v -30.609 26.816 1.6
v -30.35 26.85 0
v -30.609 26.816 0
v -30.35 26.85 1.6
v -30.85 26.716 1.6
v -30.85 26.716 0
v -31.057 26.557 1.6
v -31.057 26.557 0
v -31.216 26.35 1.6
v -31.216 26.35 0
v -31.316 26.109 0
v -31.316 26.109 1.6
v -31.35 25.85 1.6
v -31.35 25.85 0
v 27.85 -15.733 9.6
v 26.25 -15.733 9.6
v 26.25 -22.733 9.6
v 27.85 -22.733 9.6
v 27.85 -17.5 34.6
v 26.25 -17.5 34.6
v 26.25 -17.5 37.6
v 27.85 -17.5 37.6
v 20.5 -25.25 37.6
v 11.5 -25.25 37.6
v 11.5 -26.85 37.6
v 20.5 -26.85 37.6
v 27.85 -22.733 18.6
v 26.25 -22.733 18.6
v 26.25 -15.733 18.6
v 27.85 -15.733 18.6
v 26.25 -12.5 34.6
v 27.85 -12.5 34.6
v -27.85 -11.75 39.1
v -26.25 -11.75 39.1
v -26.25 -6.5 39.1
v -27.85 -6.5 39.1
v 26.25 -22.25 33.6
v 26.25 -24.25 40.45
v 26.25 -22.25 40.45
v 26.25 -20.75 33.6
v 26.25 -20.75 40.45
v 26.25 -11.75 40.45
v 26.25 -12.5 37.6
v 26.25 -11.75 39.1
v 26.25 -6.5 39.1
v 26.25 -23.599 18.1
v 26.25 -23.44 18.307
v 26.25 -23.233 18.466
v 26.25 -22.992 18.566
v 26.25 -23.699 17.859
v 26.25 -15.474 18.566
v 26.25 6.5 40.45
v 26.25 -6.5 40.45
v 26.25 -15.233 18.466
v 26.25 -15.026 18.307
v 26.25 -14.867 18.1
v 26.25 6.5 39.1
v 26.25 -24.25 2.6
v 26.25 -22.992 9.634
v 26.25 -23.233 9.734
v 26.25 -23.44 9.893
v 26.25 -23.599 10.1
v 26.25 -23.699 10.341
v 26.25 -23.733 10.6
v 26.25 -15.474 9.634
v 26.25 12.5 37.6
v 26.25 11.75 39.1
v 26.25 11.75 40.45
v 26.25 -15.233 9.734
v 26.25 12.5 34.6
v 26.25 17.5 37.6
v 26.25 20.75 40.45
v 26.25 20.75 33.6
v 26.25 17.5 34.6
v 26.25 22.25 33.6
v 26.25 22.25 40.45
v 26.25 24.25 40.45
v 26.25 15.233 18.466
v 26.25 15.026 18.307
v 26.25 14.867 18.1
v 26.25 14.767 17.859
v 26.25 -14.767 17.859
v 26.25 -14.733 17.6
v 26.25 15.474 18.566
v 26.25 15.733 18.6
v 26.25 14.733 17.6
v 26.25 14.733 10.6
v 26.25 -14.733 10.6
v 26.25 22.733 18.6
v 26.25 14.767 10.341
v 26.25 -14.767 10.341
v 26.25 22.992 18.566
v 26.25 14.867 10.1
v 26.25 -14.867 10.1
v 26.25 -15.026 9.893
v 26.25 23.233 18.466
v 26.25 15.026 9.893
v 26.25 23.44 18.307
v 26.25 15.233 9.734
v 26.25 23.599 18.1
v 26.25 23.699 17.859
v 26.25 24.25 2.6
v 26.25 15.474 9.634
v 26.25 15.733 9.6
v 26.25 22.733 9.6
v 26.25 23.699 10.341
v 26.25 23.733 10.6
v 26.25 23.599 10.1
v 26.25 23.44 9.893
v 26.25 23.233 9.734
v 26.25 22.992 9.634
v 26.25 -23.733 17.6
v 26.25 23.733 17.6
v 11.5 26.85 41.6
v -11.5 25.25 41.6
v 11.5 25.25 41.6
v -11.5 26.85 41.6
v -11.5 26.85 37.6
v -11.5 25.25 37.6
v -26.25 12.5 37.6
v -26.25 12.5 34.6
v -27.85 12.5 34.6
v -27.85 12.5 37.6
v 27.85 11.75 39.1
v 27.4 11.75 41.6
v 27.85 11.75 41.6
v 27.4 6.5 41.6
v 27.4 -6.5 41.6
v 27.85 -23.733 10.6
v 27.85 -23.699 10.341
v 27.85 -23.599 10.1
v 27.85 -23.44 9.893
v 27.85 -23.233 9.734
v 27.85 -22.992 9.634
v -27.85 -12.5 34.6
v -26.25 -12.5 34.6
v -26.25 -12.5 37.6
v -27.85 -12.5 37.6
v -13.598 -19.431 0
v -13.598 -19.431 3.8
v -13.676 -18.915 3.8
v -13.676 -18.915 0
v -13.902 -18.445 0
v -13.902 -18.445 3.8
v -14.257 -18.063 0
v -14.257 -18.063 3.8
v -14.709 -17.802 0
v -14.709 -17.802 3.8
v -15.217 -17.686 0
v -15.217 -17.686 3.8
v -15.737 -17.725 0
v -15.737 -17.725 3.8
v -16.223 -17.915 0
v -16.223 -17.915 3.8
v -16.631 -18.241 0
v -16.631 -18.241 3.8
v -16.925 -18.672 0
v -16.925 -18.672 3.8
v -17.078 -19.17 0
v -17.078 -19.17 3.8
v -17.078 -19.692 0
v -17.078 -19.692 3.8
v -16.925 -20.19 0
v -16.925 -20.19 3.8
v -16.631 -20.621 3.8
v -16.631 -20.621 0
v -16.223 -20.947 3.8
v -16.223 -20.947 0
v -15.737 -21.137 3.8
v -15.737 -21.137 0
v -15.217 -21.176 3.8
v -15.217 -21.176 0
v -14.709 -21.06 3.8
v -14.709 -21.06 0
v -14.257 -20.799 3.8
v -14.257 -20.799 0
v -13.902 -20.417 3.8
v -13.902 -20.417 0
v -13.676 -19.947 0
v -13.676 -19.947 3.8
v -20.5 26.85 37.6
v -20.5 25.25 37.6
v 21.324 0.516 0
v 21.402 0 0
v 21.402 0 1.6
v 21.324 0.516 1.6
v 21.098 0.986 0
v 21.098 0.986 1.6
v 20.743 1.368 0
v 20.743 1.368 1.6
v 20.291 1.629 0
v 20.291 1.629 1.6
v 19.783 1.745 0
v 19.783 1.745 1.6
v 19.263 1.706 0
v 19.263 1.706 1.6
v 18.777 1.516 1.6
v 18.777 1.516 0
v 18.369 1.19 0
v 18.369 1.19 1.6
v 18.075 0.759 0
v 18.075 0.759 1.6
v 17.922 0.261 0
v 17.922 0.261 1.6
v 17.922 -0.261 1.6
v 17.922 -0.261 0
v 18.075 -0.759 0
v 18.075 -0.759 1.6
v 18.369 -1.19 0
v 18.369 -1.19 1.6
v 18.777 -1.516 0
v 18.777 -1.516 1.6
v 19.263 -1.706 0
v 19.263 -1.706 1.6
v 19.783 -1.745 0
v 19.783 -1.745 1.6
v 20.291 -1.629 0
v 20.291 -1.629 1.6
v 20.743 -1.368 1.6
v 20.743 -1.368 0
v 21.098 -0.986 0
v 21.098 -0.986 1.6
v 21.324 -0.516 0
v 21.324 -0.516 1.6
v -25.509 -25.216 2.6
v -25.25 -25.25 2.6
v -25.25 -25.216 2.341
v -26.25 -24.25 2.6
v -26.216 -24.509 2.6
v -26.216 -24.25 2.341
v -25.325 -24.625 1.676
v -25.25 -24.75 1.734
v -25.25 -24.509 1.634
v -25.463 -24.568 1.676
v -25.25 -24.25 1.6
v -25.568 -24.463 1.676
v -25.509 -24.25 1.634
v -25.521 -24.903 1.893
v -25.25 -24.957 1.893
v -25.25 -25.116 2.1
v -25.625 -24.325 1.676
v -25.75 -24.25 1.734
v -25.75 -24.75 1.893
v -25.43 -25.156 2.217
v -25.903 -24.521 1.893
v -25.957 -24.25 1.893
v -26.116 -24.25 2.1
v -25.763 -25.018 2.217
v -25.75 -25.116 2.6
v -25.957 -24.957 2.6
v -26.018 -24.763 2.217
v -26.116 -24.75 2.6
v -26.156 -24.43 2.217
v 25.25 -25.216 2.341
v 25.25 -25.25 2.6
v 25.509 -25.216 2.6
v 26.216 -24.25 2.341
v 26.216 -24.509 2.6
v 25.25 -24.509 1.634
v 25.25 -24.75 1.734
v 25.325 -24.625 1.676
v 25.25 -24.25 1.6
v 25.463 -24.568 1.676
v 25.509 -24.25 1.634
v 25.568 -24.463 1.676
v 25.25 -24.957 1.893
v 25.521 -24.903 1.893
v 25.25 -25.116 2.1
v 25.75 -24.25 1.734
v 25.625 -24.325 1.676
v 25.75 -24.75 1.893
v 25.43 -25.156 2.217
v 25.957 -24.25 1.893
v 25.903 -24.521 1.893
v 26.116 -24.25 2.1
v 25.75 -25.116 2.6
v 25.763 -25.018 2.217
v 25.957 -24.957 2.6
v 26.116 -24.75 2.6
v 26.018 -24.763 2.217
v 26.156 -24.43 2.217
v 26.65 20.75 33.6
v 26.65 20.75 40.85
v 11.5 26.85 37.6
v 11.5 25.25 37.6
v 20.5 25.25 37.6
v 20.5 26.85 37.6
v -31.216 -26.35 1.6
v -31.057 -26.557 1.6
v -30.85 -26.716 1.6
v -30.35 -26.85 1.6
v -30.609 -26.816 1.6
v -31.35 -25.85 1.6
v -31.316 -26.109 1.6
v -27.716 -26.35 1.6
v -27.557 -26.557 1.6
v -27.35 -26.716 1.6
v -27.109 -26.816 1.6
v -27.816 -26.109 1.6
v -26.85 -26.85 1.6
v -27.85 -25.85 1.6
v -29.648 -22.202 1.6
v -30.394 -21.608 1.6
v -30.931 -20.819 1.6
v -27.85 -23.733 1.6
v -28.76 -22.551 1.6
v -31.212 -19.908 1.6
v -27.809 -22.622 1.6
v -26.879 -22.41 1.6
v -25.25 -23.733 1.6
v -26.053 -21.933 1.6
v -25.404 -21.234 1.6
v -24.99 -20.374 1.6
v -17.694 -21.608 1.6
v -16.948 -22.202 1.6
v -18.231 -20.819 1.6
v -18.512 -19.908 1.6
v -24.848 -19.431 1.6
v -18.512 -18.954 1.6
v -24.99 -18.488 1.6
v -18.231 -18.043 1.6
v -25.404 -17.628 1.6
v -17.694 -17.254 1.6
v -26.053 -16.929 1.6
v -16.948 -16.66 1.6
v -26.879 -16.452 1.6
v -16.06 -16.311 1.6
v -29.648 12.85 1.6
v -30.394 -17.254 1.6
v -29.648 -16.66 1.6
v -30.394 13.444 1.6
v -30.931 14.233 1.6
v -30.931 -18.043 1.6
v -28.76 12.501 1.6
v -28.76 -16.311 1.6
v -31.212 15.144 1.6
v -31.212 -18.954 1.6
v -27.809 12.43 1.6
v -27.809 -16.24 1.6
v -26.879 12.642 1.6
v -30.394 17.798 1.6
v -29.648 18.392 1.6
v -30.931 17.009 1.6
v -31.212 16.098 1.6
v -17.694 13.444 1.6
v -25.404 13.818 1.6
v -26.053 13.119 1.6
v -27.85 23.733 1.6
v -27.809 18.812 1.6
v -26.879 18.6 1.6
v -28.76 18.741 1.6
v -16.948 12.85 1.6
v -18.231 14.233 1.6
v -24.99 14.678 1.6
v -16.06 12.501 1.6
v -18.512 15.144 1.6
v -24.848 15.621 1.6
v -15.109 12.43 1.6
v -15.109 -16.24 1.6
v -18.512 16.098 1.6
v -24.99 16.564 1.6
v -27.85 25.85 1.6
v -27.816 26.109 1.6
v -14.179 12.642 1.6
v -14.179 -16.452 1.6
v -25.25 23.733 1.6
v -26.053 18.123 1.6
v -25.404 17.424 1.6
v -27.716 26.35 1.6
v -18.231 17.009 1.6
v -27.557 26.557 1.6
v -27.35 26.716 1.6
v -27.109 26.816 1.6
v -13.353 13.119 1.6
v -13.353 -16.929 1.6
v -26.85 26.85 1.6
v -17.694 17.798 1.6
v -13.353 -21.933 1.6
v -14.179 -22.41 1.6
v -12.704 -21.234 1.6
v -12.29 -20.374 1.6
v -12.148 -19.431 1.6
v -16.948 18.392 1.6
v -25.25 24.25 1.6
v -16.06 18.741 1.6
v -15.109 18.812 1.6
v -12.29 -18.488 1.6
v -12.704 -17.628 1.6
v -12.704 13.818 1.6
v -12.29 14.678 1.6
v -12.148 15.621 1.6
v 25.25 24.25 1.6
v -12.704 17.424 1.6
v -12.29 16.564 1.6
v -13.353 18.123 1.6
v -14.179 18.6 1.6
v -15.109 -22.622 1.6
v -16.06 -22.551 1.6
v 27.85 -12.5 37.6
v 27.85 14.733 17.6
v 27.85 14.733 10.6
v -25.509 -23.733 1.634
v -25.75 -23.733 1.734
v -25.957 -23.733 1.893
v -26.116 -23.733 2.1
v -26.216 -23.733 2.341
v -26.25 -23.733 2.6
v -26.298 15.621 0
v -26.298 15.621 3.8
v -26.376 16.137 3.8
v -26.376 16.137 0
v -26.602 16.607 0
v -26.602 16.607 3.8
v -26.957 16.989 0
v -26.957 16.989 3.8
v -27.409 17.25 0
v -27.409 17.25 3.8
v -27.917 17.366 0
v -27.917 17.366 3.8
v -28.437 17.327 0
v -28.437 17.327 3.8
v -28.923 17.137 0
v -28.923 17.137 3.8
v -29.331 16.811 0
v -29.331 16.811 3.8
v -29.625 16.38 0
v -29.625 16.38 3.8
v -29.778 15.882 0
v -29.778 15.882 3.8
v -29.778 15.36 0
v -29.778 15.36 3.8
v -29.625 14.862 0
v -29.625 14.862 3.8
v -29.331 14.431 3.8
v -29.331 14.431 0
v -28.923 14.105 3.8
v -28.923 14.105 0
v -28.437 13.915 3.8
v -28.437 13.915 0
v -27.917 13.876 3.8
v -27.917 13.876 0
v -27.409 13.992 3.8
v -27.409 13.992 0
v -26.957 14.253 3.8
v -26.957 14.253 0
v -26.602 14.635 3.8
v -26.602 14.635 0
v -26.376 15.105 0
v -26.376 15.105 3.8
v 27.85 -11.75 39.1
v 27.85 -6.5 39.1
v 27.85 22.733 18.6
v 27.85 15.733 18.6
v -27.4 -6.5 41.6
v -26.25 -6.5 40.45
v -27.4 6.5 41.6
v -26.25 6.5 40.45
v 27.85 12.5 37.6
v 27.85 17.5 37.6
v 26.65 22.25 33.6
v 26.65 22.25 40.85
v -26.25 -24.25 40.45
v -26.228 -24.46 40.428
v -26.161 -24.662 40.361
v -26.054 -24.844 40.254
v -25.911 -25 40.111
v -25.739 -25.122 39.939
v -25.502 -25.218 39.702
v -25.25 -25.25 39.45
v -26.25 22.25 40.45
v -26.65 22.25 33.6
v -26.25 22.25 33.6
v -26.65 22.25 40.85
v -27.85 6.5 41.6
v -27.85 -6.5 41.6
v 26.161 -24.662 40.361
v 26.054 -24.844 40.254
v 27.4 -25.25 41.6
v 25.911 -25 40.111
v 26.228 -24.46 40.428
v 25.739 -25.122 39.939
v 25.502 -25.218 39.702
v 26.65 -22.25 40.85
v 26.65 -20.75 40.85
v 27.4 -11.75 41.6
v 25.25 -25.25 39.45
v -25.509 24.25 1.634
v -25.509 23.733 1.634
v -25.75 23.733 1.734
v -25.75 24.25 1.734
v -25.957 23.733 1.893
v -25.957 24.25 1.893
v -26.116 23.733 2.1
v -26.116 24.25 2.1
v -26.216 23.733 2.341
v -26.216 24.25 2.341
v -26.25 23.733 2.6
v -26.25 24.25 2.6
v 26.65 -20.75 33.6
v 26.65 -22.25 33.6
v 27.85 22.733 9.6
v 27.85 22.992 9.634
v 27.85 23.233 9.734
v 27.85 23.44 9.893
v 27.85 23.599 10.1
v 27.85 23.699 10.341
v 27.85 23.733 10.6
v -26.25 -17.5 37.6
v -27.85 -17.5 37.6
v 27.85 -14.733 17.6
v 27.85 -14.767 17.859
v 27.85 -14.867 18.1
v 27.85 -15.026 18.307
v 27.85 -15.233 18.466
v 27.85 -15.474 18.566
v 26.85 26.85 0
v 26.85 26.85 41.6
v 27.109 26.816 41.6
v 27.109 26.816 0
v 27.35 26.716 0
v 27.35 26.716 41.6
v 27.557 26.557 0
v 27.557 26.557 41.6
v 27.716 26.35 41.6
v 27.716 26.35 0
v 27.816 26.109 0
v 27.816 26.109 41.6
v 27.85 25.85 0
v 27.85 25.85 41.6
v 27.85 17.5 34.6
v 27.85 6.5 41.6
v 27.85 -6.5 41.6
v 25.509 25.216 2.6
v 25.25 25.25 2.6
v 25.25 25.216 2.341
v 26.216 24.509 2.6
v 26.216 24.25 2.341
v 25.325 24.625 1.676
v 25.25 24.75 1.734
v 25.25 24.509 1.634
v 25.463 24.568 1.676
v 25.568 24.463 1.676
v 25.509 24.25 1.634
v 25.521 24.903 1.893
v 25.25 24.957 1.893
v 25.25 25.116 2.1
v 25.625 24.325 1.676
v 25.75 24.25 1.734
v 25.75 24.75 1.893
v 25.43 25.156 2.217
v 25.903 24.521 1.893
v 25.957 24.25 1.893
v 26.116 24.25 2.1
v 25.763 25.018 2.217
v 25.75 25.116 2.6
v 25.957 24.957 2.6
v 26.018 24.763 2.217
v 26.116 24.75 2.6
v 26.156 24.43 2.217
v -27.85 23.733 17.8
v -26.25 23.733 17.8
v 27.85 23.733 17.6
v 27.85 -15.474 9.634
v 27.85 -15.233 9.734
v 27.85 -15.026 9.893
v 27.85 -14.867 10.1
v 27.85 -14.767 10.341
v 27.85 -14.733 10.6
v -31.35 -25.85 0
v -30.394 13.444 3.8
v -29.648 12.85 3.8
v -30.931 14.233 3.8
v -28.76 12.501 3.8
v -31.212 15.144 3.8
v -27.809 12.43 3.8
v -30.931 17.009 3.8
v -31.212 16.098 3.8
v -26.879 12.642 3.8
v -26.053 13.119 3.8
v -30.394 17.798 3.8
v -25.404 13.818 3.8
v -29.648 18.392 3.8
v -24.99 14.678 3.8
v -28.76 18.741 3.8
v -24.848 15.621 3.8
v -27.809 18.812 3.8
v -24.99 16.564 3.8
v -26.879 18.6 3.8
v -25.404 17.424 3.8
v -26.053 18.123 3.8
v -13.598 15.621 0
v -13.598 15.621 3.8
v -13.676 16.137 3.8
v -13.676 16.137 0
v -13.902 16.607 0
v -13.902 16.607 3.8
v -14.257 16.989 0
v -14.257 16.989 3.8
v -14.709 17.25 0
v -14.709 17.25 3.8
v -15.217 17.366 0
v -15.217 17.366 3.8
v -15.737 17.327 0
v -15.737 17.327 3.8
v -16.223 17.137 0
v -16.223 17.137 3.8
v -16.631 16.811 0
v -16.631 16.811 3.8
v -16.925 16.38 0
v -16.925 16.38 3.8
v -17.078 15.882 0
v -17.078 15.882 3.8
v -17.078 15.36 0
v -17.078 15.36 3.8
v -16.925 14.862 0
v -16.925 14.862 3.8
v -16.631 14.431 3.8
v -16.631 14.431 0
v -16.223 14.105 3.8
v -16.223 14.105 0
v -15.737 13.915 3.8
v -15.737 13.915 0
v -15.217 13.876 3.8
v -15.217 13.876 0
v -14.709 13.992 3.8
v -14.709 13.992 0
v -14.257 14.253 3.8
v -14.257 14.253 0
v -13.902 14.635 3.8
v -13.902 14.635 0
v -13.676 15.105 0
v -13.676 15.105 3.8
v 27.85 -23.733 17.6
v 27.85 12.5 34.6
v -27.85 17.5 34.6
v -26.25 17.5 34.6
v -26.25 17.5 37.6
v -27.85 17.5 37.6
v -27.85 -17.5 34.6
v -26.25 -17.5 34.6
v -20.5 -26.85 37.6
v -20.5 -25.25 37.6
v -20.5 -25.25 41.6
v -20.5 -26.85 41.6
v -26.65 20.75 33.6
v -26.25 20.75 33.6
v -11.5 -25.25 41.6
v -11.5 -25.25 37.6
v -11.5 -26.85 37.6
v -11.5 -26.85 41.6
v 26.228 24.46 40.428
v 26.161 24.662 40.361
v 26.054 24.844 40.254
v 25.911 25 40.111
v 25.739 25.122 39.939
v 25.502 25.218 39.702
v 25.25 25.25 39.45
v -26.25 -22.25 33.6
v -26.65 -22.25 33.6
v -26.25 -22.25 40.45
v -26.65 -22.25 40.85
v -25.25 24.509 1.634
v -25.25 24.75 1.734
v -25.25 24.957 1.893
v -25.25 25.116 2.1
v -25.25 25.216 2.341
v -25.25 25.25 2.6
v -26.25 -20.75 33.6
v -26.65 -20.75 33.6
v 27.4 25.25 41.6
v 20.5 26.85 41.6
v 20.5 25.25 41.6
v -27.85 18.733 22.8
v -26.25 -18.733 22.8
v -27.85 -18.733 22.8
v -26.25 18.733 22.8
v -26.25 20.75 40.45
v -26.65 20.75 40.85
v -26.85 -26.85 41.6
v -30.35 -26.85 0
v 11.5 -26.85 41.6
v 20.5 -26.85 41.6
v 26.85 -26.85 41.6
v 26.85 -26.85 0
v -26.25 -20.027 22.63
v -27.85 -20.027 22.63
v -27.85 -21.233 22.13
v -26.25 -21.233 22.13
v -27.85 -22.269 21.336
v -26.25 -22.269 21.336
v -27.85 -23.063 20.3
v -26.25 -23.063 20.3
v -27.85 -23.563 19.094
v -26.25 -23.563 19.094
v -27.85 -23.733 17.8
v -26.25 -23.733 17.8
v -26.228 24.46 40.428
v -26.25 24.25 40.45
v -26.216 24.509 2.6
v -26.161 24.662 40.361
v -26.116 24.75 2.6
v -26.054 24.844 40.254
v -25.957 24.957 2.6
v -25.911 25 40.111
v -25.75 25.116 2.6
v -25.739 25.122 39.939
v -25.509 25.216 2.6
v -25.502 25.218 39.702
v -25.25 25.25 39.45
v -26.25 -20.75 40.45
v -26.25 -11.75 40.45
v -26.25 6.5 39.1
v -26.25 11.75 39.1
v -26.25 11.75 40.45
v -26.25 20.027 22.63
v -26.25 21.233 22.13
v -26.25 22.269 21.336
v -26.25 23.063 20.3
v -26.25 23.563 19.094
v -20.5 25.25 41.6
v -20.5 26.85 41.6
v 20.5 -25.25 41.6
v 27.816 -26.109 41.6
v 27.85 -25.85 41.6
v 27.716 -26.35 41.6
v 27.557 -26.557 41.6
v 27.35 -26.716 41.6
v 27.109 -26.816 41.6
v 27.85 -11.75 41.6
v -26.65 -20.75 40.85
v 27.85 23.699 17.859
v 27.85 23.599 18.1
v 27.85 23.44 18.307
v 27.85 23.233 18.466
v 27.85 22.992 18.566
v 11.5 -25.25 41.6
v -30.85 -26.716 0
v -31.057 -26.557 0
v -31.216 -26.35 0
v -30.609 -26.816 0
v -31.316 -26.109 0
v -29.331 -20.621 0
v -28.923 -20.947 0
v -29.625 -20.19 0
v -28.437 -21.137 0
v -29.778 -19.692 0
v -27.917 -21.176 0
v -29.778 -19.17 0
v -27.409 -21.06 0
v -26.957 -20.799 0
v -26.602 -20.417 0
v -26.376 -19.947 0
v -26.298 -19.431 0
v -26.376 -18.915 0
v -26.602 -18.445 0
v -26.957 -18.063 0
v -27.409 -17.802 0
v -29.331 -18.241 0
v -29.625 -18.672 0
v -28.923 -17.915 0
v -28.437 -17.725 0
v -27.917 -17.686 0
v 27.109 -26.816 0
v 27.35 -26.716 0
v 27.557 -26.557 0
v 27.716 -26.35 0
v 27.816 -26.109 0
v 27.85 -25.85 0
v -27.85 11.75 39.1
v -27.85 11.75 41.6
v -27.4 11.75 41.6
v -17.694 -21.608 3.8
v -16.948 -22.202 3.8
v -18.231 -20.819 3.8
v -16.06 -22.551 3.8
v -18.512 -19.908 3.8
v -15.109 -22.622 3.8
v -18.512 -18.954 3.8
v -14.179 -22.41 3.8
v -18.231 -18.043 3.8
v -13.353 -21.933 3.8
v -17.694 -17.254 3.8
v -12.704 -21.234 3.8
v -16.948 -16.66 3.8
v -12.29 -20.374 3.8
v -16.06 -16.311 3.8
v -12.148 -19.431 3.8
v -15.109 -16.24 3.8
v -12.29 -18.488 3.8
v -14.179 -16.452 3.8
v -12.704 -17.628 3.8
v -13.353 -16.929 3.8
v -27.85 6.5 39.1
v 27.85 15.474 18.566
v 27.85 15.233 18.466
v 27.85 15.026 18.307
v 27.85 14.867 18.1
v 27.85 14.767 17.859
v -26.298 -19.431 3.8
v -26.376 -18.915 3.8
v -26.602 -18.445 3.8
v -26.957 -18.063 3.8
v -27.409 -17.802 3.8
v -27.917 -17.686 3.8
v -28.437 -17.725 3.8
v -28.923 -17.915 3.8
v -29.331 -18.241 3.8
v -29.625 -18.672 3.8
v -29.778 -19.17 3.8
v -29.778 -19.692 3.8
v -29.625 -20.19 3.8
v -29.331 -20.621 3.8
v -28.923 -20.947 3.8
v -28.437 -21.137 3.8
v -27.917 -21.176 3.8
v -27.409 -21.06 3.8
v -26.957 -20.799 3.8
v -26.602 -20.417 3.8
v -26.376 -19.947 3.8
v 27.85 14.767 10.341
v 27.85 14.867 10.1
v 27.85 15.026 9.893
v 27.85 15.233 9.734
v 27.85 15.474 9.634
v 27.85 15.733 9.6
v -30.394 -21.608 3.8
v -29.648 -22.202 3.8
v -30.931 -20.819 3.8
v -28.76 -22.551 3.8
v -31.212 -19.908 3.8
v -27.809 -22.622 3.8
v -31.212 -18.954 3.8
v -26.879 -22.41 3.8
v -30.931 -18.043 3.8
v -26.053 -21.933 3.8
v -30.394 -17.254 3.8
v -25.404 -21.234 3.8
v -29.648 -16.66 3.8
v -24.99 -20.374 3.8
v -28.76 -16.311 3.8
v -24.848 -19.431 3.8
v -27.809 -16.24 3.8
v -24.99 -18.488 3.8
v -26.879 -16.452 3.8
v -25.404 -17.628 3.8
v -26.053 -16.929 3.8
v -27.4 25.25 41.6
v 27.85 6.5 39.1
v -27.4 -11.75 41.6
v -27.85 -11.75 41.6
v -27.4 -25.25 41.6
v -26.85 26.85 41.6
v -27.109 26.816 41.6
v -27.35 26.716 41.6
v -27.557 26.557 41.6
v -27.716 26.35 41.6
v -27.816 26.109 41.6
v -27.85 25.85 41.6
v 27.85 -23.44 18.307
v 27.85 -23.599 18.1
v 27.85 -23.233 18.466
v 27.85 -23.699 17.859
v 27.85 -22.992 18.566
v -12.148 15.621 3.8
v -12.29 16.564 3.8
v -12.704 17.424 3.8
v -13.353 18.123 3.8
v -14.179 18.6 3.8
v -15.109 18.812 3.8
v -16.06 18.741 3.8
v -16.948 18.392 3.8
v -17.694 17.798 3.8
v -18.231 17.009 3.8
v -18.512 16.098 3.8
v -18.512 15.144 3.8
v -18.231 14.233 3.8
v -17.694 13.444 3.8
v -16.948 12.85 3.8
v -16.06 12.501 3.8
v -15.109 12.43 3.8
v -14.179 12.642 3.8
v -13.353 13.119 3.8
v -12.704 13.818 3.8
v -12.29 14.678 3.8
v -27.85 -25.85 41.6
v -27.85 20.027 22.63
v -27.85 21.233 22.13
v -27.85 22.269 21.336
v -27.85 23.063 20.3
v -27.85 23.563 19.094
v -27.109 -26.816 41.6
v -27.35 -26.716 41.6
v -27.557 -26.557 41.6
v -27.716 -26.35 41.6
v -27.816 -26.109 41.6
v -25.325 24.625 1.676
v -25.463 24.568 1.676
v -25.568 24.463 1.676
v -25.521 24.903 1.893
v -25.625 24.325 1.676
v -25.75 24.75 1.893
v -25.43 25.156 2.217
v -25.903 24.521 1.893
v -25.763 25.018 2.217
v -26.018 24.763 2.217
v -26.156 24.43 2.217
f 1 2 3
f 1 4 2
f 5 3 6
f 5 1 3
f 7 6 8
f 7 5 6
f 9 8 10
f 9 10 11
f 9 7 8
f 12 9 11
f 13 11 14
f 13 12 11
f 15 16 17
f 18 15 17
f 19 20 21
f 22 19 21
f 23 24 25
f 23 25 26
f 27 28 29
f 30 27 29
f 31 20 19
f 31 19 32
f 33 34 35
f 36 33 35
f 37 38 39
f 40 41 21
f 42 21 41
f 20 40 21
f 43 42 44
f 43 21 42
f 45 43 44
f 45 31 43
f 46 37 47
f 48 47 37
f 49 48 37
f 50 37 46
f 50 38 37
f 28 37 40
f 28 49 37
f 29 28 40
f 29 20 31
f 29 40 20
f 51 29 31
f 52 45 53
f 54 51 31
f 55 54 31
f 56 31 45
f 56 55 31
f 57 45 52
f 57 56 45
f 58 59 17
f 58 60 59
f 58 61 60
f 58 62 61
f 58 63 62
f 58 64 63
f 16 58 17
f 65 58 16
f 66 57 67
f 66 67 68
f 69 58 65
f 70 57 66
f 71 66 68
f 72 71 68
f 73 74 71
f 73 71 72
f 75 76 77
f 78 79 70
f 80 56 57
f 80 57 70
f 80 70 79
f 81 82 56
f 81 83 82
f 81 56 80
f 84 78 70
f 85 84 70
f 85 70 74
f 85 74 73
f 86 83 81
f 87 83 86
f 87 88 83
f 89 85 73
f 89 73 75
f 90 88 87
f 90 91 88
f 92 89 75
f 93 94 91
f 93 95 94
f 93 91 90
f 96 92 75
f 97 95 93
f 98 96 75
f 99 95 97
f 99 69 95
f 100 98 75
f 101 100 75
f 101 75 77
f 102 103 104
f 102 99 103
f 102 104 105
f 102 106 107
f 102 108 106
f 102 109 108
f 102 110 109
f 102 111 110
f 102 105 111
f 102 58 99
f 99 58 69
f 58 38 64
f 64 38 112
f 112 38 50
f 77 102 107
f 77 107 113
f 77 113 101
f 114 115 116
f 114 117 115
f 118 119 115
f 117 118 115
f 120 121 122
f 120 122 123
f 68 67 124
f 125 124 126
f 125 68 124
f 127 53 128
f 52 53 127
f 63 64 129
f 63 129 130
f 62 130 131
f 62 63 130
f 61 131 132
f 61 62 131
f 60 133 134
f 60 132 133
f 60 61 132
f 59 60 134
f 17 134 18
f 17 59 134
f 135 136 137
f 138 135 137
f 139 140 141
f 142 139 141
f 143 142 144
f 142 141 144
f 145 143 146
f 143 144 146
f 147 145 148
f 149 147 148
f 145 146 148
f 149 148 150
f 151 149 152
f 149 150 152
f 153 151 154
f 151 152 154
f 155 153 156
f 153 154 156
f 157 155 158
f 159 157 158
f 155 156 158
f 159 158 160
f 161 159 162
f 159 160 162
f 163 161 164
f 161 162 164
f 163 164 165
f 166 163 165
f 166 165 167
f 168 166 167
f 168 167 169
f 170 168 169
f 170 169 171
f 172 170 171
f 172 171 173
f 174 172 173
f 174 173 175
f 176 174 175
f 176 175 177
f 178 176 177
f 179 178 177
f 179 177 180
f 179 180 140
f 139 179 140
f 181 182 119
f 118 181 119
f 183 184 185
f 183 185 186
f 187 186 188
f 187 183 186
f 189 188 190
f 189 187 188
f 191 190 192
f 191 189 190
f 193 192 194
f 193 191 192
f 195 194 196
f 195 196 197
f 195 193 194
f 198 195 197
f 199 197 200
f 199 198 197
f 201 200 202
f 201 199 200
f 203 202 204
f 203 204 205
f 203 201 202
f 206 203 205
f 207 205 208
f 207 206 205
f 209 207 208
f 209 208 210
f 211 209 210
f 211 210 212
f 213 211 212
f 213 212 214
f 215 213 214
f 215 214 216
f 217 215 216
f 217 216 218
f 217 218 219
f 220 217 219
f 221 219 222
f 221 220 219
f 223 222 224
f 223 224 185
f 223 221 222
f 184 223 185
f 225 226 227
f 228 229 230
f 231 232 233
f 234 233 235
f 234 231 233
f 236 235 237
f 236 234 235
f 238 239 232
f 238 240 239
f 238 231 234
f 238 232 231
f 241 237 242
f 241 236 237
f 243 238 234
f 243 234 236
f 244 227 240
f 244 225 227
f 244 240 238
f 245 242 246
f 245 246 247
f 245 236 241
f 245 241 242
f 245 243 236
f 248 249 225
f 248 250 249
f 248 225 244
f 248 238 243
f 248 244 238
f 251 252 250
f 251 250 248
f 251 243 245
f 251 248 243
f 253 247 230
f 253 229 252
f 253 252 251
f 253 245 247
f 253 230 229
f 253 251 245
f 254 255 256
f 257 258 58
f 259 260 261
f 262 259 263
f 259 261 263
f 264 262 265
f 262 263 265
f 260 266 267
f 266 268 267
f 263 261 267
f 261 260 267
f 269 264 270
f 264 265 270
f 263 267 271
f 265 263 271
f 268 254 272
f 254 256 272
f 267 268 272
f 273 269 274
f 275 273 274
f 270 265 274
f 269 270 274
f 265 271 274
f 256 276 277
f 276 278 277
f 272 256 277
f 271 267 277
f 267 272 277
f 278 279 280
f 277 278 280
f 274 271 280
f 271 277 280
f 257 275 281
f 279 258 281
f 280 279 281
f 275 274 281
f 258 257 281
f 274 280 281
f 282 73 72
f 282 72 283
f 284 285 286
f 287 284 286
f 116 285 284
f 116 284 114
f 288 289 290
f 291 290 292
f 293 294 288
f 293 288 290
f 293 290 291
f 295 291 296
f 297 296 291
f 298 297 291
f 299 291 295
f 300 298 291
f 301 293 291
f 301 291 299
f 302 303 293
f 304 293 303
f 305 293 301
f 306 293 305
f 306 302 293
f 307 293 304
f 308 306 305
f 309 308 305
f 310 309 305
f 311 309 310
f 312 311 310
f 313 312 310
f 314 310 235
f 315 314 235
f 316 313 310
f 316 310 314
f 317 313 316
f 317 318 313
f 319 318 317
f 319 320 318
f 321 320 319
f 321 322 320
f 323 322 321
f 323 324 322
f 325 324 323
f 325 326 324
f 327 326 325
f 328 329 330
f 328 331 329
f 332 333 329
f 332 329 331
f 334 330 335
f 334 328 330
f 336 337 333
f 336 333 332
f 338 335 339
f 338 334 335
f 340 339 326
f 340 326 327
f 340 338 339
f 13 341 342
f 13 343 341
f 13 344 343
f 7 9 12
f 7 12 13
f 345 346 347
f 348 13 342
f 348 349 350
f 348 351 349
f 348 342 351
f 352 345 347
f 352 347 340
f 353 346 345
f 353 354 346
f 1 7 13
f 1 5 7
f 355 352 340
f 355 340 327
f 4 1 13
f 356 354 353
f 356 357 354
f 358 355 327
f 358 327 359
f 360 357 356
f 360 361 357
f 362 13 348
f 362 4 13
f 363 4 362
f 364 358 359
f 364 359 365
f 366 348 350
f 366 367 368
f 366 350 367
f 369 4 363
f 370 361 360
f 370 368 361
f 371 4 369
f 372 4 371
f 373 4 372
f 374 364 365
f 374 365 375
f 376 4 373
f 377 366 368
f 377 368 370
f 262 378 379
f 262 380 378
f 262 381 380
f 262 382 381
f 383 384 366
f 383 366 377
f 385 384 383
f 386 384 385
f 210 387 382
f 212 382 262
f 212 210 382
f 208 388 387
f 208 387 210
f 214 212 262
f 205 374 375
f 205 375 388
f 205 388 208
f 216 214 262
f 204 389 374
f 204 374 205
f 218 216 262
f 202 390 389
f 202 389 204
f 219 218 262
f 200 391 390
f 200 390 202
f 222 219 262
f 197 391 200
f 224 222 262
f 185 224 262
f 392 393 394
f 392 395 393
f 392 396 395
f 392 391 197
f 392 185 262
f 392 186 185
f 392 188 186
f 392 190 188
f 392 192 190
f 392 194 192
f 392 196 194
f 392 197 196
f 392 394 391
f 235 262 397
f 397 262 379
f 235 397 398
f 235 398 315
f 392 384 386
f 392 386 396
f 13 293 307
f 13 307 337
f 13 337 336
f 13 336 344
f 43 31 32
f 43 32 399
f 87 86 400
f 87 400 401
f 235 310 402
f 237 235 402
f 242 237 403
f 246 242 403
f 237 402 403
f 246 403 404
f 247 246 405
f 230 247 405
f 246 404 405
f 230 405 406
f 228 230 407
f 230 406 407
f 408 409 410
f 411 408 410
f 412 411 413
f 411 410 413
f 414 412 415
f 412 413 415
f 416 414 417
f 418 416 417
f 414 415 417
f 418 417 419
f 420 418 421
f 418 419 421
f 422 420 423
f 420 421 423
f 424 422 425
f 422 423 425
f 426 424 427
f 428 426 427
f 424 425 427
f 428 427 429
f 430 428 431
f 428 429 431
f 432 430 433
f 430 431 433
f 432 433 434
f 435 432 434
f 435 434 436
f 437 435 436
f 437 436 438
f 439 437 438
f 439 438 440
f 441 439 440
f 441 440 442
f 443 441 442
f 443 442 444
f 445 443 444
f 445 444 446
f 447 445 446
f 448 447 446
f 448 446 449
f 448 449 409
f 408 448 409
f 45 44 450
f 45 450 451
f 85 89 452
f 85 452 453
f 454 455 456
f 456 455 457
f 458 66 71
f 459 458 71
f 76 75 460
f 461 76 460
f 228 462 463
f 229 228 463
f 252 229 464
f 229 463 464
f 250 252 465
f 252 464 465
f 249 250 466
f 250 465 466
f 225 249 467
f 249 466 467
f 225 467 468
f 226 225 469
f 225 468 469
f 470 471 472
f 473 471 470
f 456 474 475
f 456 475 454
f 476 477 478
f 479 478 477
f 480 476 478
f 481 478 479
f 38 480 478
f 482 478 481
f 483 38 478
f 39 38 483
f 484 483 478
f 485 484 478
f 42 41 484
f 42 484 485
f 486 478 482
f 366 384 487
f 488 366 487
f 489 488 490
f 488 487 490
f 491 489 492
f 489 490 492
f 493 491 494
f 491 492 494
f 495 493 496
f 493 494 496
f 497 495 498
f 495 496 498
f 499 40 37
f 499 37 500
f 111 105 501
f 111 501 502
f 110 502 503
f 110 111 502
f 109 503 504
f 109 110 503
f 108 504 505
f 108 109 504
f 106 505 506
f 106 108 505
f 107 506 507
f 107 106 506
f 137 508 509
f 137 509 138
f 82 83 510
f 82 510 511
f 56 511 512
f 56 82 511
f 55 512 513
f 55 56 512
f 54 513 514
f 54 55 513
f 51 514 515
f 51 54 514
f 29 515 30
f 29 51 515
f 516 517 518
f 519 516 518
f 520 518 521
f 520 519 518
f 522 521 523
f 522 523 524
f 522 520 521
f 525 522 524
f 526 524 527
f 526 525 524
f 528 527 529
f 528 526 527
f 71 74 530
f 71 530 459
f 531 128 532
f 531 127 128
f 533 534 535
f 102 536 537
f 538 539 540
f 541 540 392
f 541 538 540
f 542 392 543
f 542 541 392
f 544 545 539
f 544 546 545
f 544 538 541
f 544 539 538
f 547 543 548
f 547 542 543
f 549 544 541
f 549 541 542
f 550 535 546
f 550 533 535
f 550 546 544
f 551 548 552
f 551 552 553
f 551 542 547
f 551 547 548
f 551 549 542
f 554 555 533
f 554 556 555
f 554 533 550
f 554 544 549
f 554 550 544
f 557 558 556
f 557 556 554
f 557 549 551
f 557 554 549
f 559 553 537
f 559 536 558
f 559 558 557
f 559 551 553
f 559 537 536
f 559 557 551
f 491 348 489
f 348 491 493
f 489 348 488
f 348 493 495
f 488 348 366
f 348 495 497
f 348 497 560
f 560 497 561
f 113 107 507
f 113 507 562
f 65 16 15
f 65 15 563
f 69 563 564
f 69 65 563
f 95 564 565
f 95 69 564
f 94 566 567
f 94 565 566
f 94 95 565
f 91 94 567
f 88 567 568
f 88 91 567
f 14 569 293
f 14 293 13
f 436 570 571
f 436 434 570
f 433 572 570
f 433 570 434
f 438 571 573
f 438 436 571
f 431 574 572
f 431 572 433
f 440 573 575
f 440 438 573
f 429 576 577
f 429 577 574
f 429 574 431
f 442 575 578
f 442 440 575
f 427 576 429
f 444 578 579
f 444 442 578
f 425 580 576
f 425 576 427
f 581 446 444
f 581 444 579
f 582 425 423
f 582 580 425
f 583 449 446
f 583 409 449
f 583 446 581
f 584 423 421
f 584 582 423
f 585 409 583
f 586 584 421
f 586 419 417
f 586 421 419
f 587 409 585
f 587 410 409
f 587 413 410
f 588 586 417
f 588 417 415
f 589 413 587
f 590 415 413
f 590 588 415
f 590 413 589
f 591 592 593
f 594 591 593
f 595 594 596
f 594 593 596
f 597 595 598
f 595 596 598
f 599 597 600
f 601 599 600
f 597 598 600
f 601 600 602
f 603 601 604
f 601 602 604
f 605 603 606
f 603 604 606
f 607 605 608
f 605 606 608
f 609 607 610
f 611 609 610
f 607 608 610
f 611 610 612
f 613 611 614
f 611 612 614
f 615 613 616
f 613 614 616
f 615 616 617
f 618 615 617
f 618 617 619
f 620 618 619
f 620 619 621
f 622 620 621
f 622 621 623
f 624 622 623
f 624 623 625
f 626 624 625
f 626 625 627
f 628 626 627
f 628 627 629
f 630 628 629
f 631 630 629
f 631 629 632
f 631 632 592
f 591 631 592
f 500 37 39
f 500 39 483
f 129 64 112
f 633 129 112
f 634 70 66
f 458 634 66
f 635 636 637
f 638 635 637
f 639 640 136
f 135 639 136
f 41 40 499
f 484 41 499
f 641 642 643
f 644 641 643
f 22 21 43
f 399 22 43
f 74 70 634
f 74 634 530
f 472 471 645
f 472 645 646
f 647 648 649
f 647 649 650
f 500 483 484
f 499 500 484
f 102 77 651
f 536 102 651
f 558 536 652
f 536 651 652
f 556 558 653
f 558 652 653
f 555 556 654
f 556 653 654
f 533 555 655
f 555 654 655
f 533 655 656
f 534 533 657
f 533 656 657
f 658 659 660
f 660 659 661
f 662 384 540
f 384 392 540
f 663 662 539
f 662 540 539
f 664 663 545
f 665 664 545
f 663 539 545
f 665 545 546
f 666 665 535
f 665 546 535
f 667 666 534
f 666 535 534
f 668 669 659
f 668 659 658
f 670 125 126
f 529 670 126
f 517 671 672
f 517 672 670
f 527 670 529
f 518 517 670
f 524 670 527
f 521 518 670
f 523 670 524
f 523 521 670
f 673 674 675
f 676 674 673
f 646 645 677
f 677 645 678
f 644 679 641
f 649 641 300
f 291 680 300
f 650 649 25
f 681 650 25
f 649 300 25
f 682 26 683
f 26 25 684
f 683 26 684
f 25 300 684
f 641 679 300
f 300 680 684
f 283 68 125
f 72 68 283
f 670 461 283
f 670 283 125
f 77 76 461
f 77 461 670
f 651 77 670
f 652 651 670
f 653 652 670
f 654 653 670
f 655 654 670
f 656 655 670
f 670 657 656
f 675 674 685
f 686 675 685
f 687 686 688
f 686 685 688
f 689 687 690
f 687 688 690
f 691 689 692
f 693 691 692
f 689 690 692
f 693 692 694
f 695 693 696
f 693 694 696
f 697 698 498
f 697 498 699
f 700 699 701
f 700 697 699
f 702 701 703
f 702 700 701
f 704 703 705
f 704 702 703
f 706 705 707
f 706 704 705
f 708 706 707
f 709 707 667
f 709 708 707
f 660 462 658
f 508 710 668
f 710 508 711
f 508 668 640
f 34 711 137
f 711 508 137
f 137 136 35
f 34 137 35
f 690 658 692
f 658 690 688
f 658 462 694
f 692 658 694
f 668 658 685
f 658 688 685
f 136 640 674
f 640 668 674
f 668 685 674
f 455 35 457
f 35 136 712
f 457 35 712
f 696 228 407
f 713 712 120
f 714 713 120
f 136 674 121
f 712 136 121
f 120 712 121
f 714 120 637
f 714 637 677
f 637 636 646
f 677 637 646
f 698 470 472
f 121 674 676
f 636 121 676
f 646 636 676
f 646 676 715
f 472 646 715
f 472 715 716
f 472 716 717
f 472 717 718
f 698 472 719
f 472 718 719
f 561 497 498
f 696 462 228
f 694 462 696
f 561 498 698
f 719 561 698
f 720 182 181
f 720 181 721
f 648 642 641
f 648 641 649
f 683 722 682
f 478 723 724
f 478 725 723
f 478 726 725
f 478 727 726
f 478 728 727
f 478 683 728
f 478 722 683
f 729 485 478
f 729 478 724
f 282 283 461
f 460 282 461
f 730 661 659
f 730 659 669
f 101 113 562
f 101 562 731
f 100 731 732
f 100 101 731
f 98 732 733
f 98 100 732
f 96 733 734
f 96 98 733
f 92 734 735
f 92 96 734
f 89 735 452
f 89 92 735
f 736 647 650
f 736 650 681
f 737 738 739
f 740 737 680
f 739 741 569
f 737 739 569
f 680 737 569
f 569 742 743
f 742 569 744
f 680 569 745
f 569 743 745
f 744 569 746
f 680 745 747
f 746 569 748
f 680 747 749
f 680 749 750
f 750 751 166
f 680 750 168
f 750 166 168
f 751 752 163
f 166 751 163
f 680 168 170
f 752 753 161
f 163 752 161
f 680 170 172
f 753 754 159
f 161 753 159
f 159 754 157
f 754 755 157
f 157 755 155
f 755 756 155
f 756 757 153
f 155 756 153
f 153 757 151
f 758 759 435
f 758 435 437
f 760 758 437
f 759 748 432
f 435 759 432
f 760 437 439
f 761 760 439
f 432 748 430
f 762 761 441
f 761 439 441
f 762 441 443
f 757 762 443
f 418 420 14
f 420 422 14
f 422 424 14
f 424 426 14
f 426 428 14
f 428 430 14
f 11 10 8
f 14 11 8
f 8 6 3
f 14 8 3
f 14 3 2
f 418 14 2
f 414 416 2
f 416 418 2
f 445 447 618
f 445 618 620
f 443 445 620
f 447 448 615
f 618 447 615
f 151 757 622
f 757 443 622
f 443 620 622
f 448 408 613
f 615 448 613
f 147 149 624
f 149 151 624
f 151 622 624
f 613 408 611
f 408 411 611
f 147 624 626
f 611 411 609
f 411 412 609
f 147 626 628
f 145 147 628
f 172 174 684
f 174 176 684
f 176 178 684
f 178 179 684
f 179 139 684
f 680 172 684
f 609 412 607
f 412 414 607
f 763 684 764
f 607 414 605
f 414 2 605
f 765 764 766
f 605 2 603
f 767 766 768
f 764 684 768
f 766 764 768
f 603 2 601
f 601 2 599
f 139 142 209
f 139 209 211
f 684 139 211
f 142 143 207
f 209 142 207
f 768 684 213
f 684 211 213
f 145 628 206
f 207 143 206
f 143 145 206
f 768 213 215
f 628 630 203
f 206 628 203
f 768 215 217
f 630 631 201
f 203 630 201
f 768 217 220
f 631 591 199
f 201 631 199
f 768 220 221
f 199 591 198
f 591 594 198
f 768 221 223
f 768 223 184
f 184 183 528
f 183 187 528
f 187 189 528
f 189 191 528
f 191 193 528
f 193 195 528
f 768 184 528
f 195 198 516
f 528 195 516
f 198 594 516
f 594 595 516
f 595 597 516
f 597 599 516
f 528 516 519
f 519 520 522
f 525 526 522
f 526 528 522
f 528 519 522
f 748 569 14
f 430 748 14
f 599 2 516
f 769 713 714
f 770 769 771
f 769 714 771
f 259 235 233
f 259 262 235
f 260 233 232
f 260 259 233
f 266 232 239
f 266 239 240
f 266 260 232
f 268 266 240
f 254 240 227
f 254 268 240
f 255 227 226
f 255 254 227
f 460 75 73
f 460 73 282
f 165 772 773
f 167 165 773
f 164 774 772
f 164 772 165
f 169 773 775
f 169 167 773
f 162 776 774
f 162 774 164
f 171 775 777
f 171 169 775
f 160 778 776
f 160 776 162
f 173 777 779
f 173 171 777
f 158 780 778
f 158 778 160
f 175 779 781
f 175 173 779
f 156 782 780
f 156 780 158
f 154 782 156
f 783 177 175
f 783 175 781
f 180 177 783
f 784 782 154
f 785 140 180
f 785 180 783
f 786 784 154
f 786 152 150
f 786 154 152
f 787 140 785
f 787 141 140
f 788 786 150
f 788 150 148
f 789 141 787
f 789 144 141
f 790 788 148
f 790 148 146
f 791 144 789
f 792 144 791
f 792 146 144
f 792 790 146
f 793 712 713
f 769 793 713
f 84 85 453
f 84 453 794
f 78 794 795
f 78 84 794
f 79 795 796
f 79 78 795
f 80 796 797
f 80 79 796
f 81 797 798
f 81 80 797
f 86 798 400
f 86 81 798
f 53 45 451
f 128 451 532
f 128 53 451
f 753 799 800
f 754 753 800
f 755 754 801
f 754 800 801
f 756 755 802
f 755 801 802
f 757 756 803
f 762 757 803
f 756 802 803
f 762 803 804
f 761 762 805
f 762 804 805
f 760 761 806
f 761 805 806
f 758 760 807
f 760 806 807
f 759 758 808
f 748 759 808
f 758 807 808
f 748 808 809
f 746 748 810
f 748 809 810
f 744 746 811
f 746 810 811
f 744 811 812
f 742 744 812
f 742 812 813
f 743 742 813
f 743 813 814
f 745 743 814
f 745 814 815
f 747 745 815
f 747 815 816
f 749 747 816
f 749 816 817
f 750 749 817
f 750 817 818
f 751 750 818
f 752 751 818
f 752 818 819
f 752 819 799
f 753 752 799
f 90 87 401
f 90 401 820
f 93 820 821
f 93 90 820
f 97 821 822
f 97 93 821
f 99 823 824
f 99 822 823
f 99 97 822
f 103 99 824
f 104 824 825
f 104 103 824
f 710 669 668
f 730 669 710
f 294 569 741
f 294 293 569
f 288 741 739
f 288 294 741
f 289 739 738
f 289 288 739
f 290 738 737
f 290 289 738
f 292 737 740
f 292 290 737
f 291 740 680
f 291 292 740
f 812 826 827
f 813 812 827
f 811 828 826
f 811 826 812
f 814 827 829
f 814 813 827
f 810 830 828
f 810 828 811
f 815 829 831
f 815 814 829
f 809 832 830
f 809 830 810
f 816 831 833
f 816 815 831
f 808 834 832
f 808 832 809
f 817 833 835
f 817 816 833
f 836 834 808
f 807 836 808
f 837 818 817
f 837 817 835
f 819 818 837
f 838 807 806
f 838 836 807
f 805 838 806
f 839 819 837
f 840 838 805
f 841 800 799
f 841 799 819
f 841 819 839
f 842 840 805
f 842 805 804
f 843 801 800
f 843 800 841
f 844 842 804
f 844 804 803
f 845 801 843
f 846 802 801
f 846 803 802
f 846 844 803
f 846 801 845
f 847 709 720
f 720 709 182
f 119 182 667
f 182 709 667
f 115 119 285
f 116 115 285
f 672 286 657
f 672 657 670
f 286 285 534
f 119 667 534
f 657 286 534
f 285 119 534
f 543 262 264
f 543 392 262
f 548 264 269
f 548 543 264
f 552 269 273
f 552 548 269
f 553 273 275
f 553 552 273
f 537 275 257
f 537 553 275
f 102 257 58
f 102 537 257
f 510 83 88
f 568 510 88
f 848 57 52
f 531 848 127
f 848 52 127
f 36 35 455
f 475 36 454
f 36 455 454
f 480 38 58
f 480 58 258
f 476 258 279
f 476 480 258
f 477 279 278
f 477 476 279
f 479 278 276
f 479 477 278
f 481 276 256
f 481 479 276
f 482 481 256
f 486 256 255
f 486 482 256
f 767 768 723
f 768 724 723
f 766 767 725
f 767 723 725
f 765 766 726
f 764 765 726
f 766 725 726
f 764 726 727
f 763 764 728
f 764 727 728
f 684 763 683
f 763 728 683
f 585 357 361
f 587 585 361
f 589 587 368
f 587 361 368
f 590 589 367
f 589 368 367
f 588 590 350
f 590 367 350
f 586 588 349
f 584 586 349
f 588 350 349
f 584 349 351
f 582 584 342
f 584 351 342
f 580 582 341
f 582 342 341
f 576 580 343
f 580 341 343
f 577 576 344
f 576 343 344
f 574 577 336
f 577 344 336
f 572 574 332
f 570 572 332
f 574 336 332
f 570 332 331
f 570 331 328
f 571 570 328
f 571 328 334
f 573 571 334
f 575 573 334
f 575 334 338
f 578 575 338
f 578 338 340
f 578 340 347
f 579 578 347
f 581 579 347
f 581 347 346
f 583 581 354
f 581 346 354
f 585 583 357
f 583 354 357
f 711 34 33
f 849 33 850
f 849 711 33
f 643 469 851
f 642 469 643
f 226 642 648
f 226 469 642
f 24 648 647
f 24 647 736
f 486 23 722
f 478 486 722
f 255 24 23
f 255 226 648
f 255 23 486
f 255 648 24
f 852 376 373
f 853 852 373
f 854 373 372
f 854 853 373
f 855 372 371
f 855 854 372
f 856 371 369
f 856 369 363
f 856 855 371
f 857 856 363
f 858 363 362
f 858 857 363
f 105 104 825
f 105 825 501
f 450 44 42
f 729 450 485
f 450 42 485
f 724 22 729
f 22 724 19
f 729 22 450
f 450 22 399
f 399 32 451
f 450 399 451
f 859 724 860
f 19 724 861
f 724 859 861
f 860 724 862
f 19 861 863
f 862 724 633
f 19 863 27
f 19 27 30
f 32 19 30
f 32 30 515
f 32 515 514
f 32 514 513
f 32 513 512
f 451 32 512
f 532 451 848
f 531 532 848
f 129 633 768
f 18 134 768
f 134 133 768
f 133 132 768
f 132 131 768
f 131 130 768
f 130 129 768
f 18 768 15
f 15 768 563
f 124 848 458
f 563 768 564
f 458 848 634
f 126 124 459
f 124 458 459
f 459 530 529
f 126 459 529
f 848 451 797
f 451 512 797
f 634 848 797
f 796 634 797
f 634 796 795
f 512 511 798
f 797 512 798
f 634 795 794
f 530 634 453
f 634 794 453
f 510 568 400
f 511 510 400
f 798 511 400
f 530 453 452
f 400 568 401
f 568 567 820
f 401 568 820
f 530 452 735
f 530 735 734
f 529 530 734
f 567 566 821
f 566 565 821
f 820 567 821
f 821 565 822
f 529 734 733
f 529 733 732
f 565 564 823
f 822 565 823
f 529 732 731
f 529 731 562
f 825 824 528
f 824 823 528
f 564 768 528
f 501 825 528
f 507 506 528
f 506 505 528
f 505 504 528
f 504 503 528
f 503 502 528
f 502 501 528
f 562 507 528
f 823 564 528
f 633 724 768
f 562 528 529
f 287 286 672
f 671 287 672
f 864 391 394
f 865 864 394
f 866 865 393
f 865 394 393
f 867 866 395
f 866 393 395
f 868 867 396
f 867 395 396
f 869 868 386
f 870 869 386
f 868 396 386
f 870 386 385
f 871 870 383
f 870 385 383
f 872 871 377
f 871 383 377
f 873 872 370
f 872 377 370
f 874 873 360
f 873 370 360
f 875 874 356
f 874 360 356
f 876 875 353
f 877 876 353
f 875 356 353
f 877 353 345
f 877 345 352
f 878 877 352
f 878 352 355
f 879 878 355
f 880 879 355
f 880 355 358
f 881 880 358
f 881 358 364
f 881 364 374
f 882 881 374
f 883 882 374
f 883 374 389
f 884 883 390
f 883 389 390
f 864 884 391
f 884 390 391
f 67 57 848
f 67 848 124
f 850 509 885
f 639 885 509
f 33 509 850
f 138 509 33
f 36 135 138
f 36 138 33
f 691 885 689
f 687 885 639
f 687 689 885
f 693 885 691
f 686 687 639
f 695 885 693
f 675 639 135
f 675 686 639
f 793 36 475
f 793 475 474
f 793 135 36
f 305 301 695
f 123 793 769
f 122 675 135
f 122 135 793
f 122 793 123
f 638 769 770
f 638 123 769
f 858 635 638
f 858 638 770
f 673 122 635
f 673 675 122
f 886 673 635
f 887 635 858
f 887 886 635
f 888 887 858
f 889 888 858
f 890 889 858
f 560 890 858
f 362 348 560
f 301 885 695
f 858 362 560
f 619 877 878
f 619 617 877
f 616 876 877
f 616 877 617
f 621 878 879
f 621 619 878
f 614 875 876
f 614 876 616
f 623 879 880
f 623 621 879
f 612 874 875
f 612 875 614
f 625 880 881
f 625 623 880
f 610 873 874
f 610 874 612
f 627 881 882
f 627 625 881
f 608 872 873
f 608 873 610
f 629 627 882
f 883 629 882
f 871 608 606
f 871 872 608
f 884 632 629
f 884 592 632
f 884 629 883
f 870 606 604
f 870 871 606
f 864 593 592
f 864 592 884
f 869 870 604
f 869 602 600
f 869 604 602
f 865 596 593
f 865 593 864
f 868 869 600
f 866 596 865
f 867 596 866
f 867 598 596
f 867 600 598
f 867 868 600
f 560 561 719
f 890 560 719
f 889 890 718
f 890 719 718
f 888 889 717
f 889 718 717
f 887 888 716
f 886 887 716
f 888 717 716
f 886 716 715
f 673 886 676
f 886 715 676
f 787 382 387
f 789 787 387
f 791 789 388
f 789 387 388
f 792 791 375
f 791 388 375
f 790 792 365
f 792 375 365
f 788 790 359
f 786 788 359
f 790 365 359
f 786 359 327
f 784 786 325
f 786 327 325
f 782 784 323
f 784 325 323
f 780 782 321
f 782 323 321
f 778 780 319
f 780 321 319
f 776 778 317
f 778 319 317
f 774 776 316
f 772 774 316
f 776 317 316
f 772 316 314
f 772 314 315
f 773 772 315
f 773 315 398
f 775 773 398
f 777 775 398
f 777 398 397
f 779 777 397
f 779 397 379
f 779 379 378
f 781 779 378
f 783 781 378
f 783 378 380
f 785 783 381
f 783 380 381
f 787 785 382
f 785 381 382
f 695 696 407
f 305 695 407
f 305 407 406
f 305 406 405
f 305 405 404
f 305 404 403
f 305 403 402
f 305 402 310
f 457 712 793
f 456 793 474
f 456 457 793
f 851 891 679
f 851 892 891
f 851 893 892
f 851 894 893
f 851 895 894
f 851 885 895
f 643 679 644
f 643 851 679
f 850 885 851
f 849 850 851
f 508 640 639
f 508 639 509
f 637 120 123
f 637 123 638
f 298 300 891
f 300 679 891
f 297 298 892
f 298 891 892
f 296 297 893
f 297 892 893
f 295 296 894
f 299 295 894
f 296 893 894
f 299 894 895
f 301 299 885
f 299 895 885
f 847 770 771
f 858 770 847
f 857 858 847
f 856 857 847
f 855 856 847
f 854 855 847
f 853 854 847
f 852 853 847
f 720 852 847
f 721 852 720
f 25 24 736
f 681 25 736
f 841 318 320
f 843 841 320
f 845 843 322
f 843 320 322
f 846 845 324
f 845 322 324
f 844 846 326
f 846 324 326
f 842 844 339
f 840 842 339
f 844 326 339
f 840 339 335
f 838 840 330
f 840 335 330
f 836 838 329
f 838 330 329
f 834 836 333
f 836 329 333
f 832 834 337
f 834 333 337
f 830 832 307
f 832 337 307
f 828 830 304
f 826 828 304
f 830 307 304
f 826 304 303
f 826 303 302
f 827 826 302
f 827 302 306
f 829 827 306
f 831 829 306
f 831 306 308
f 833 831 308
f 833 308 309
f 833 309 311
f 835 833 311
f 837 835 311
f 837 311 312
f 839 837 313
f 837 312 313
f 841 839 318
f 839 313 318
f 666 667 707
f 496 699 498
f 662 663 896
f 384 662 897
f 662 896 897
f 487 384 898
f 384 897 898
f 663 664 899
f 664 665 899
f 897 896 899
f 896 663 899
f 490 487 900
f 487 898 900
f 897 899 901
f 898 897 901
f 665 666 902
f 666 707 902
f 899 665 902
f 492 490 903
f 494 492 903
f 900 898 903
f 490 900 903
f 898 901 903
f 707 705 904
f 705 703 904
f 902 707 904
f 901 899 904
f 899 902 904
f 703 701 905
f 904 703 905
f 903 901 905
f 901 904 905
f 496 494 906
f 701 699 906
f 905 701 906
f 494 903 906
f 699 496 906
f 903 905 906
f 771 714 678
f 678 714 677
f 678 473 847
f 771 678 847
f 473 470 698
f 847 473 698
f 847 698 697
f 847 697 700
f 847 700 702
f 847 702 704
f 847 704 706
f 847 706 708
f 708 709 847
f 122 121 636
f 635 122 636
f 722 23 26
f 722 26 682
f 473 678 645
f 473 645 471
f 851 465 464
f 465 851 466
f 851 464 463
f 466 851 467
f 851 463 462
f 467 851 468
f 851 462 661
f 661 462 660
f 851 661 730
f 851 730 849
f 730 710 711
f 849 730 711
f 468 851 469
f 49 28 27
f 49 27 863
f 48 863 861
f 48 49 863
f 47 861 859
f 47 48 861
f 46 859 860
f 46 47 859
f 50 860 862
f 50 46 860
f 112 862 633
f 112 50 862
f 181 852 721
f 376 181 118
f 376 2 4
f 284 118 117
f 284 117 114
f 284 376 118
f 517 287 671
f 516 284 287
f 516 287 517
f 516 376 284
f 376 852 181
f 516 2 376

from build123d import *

# Parameters (mm, degrees)
SKETCH034_W          = 59.2
SKETCH034_H          = 53.7
SKETCH034_R          = 1.75
PAD011_DEPTH         = 1.6
SKETCH032_W          = 55.7
SKETCH032_H          = 53.7
SKETCH032_W_2        = 52.5
SKETCH032_H_2        = 50.5
PAD010_DEPTH         = 40
CHAMFER001_SIZE      = 1.15
FILLET004_R          = 1
SKETCH033_W          = 5
SKETCH033_H          = 3
SKETCH033_W_2        = 5.25
SKETCH033_H_2        = 2.5
POCKET007_DEPTH      = 31.351
POCKET007_DEPTH_BACK = 27.851
POCKET_DEPTH         = 31.351
POCKET041_DEPTH      = 27.851
SKETCH030_W          = 9
SKETCH030_H          = 4
POCKET009_DEPTH      = 26.851
POCKET009_DEPTH_BACK = 26.851
SKETCH029_R          = 3.2
PAD009_DEPTH         = 2.2
SKETCH050_R          = 1.75
POCKET015_DEPTH      = 3.801
SKETCH036_W          = 0.4
SKETCH036_H          = 1.5
POCKET008_DEPTH      = 8


with BuildPart() as part:
    # Sketch034 → Pad011 (new body)
    with BuildSketch(Plane.XY):
        with Locations((-1.75, 0)):
            Rectangle(SKETCH034_W, SKETCH034_H)
        with Locations((19.652, 0)):
            Circle(SKETCH034_R, mode=Mode.SUBTRACT)
    extrude(amount=PAD011_DEPTH)

    # Sketch032 → Pad010 (join)
    with BuildSketch(Plane.XY.offset(1.6)):
        Rectangle(SKETCH032_W, SKETCH032_H)
        Rectangle(SKETCH032_W_2, SKETCH032_H_2, mode=Mode.SUBTRACT)
    extrude(amount=PAD010_DEPTH)

    # Chamfer001
    chamfer001_edges = [part.edges().sort_by_distance(p)[0] for p in [
        (26.25, 0, 41.6),
        (-26.25, 0, 41.6),
    ]]
    chamfer(chamfer001_edges, length=CHAMFER001_SIZE)

    # Fillet004
    fillet004_edges = [part.edges().sort_by_distance(p)[0] for p in [
        (26.25, -25.25, 21.025),
        (-26.25, -25.25, 21.025),
        (27.85, -26.85, 21.6),
        (-26.25, 25.25, 21.025),
        (-27.85, -26.85, 21.6),
        (26.25, 25.25, 21.025),
        (0, -25.25, 1.6),
        (0, 25.25, 1.6),
        (-27.85, 26.85, 21.6),
        (27.85, 26.85, 21.6),
        (-26.25, 0, 1.6),
        (26.25, 0, 1.6),
        (-31.35, -26.85, 0.8),
        (-31.35, 26.85, 0.8),
    ]]
    fillet(fillet004_edges, radius=FILLET004_R)

    # Sketch033 → Pocket007 (cut, two sides)
    with BuildSketch(Plane.YZ) as pocket007_sk:
        with Locations((-15, 36.1)):
            Rectangle(SKETCH033_W, SKETCH033_H)
        with Locations((15, 36.1)):
            Rectangle(SKETCH033_W, SKETCH033_H)
        with Locations((-9.125, 40.35)):
            Rectangle(SKETCH033_W_2, SKETCH033_H_2)
        with Locations((9.125, 40.35)):
            Rectangle(SKETCH033_W_2, SKETCH033_H_2)
    extrude(amount=-POCKET007_DEPTH, mode=Mode.SUBTRACT)
    extrude(pocket007_sk.sketch, amount=POCKET007_DEPTH_BACK, mode=Mode.SUBTRACT)

    # Sketch109 → Pocket (cut, through all)
    with BuildSketch(Plane.YZ):
        with BuildLine():
            Line((-23.733, 17.8), (-23.733, 1.6))
            Line((-23.733, 1.6), (23.733, 1.6))
            Line((23.733, 1.6), (23.733, 17.8))
            ThreePointArc((23.733, 17.8), (22.268534, 21.335534), (18.733, 22.8))
            Line((-18.733, 22.8), (18.733, 22.8))
            ThreePointArc((-18.733, 22.8), (-22.268534, 21.335534), (-23.733, 17.8))
        make_face()
    extrude(amount=-POCKET_DEPTH, mode=Mode.SUBTRACT)

    # Sketch110 → Pocket041 (cut, through all)
    with BuildSketch(Plane.YZ):
        with BuildLine():
            Line((-22.733, 18.6), (-15.733, 18.6))
            ThreePointArc((-14.733, 17.6), (-15.025893, 18.307107), (-15.733, 18.6))
            Line((-14.733, 17.6), (-14.733, 10.6))
            ThreePointArc((-15.733, 9.6), (-15.025893, 9.892893), (-14.733, 10.6))
            Line((-15.733, 9.6), (-22.733, 9.6))
            ThreePointArc((-23.733, 10.6), (-23.440107, 9.892893), (-22.733, 9.6))
            Line((-23.733, 10.6), (-23.733, 17.6))
            ThreePointArc((-22.733, 18.6), (-23.440107, 18.307107), (-23.733, 17.6))
        make_face()
        with BuildLine():
            Line((22.733, 18.6), (15.733, 18.6))
            ThreePointArc((15.733, 18.6), (15.025893, 18.307107), (14.733, 17.6))
            Line((14.733, 17.6), (14.733, 10.6))
            ThreePointArc((14.733, 10.6), (15.025893, 9.892893), (15.733, 9.6))
            Line((15.733, 9.6), (22.733, 9.6))
            ThreePointArc((22.733, 9.6), (23.440107, 9.892893), (23.733, 10.6))
            Line((23.733, 10.6), (23.733, 17.6))
            ThreePointArc((23.733, 17.6), (23.440107, 18.307107), (22.733, 18.6))
        make_face()
    extrude(amount=POCKET041_DEPTH, mode=Mode.SUBTRACT)

    # Sketch030 → Pocket009 (cut, two sides)
    with BuildSketch(Plane.XZ) as pocket009_sk:
        with Locations((-16, 39.6)):
            Rectangle(SKETCH030_W, SKETCH030_H)
        with Locations((16, 39.6)):
            Rectangle(SKETCH030_W, SKETCH030_H)
    extrude(amount=-POCKET009_DEPTH, mode=Mode.SUBTRACT)
    extrude(pocket009_sk.sketch, amount=POCKET009_DEPTH_BACK, mode=Mode.SUBTRACT)

    # Sketch029 → Pad009 (join)
    with BuildSketch(Plane.XY.offset(1.6)):
        with Locations((-28.048, 15.621)):
            Circle(SKETCH029_R)
        with Locations((-15.348, 15.621)):
            Circle(SKETCH029_R)
        with Locations((-15.348, -19.431)):
            Circle(SKETCH029_R)
        with Locations((-28.048, -19.431)):
            Circle(SKETCH029_R)
    extrude(amount=PAD009_DEPTH)

    # Sketch050 → Pocket015 (cut, through all)
    with BuildSketch(Plane.XY.offset(3.8)):
        with Locations((-28.048, 15.621)):
            Circle(SKETCH050_R)
        with Locations((-15.348, 15.621)):
            Circle(SKETCH050_R)
        with Locations((-15.348, -19.431)):
            Circle(SKETCH050_R)
        with Locations((-28.048, -19.431)):
            Circle(SKETCH050_R)
    extrude(amount=-POCKET015_DEPTH, mode=Mode.SUBTRACT)

    # Sketch036 → Pocket008 (cut)
    with BuildSketch(Plane.XY.offset(41.6)):
        with Locations((-26.45, 21.5)):
            Rectangle(SKETCH036_W, SKETCH036_H)
        with Locations((26.45, 21.5)):
            Rectangle(SKETCH036_W, SKETCH036_H)
        with Locations((-26.45, -21.5)):
            Rectangle(SKETCH036_W, SKETCH036_H)
        with Locations((26.45, -21.5)):
            Rectangle(SKETCH036_W, SKETCH036_H)
    extrude(amount=-POCKET008_DEPTH, mode=Mode.SUBTRACT)


solid = part.part
